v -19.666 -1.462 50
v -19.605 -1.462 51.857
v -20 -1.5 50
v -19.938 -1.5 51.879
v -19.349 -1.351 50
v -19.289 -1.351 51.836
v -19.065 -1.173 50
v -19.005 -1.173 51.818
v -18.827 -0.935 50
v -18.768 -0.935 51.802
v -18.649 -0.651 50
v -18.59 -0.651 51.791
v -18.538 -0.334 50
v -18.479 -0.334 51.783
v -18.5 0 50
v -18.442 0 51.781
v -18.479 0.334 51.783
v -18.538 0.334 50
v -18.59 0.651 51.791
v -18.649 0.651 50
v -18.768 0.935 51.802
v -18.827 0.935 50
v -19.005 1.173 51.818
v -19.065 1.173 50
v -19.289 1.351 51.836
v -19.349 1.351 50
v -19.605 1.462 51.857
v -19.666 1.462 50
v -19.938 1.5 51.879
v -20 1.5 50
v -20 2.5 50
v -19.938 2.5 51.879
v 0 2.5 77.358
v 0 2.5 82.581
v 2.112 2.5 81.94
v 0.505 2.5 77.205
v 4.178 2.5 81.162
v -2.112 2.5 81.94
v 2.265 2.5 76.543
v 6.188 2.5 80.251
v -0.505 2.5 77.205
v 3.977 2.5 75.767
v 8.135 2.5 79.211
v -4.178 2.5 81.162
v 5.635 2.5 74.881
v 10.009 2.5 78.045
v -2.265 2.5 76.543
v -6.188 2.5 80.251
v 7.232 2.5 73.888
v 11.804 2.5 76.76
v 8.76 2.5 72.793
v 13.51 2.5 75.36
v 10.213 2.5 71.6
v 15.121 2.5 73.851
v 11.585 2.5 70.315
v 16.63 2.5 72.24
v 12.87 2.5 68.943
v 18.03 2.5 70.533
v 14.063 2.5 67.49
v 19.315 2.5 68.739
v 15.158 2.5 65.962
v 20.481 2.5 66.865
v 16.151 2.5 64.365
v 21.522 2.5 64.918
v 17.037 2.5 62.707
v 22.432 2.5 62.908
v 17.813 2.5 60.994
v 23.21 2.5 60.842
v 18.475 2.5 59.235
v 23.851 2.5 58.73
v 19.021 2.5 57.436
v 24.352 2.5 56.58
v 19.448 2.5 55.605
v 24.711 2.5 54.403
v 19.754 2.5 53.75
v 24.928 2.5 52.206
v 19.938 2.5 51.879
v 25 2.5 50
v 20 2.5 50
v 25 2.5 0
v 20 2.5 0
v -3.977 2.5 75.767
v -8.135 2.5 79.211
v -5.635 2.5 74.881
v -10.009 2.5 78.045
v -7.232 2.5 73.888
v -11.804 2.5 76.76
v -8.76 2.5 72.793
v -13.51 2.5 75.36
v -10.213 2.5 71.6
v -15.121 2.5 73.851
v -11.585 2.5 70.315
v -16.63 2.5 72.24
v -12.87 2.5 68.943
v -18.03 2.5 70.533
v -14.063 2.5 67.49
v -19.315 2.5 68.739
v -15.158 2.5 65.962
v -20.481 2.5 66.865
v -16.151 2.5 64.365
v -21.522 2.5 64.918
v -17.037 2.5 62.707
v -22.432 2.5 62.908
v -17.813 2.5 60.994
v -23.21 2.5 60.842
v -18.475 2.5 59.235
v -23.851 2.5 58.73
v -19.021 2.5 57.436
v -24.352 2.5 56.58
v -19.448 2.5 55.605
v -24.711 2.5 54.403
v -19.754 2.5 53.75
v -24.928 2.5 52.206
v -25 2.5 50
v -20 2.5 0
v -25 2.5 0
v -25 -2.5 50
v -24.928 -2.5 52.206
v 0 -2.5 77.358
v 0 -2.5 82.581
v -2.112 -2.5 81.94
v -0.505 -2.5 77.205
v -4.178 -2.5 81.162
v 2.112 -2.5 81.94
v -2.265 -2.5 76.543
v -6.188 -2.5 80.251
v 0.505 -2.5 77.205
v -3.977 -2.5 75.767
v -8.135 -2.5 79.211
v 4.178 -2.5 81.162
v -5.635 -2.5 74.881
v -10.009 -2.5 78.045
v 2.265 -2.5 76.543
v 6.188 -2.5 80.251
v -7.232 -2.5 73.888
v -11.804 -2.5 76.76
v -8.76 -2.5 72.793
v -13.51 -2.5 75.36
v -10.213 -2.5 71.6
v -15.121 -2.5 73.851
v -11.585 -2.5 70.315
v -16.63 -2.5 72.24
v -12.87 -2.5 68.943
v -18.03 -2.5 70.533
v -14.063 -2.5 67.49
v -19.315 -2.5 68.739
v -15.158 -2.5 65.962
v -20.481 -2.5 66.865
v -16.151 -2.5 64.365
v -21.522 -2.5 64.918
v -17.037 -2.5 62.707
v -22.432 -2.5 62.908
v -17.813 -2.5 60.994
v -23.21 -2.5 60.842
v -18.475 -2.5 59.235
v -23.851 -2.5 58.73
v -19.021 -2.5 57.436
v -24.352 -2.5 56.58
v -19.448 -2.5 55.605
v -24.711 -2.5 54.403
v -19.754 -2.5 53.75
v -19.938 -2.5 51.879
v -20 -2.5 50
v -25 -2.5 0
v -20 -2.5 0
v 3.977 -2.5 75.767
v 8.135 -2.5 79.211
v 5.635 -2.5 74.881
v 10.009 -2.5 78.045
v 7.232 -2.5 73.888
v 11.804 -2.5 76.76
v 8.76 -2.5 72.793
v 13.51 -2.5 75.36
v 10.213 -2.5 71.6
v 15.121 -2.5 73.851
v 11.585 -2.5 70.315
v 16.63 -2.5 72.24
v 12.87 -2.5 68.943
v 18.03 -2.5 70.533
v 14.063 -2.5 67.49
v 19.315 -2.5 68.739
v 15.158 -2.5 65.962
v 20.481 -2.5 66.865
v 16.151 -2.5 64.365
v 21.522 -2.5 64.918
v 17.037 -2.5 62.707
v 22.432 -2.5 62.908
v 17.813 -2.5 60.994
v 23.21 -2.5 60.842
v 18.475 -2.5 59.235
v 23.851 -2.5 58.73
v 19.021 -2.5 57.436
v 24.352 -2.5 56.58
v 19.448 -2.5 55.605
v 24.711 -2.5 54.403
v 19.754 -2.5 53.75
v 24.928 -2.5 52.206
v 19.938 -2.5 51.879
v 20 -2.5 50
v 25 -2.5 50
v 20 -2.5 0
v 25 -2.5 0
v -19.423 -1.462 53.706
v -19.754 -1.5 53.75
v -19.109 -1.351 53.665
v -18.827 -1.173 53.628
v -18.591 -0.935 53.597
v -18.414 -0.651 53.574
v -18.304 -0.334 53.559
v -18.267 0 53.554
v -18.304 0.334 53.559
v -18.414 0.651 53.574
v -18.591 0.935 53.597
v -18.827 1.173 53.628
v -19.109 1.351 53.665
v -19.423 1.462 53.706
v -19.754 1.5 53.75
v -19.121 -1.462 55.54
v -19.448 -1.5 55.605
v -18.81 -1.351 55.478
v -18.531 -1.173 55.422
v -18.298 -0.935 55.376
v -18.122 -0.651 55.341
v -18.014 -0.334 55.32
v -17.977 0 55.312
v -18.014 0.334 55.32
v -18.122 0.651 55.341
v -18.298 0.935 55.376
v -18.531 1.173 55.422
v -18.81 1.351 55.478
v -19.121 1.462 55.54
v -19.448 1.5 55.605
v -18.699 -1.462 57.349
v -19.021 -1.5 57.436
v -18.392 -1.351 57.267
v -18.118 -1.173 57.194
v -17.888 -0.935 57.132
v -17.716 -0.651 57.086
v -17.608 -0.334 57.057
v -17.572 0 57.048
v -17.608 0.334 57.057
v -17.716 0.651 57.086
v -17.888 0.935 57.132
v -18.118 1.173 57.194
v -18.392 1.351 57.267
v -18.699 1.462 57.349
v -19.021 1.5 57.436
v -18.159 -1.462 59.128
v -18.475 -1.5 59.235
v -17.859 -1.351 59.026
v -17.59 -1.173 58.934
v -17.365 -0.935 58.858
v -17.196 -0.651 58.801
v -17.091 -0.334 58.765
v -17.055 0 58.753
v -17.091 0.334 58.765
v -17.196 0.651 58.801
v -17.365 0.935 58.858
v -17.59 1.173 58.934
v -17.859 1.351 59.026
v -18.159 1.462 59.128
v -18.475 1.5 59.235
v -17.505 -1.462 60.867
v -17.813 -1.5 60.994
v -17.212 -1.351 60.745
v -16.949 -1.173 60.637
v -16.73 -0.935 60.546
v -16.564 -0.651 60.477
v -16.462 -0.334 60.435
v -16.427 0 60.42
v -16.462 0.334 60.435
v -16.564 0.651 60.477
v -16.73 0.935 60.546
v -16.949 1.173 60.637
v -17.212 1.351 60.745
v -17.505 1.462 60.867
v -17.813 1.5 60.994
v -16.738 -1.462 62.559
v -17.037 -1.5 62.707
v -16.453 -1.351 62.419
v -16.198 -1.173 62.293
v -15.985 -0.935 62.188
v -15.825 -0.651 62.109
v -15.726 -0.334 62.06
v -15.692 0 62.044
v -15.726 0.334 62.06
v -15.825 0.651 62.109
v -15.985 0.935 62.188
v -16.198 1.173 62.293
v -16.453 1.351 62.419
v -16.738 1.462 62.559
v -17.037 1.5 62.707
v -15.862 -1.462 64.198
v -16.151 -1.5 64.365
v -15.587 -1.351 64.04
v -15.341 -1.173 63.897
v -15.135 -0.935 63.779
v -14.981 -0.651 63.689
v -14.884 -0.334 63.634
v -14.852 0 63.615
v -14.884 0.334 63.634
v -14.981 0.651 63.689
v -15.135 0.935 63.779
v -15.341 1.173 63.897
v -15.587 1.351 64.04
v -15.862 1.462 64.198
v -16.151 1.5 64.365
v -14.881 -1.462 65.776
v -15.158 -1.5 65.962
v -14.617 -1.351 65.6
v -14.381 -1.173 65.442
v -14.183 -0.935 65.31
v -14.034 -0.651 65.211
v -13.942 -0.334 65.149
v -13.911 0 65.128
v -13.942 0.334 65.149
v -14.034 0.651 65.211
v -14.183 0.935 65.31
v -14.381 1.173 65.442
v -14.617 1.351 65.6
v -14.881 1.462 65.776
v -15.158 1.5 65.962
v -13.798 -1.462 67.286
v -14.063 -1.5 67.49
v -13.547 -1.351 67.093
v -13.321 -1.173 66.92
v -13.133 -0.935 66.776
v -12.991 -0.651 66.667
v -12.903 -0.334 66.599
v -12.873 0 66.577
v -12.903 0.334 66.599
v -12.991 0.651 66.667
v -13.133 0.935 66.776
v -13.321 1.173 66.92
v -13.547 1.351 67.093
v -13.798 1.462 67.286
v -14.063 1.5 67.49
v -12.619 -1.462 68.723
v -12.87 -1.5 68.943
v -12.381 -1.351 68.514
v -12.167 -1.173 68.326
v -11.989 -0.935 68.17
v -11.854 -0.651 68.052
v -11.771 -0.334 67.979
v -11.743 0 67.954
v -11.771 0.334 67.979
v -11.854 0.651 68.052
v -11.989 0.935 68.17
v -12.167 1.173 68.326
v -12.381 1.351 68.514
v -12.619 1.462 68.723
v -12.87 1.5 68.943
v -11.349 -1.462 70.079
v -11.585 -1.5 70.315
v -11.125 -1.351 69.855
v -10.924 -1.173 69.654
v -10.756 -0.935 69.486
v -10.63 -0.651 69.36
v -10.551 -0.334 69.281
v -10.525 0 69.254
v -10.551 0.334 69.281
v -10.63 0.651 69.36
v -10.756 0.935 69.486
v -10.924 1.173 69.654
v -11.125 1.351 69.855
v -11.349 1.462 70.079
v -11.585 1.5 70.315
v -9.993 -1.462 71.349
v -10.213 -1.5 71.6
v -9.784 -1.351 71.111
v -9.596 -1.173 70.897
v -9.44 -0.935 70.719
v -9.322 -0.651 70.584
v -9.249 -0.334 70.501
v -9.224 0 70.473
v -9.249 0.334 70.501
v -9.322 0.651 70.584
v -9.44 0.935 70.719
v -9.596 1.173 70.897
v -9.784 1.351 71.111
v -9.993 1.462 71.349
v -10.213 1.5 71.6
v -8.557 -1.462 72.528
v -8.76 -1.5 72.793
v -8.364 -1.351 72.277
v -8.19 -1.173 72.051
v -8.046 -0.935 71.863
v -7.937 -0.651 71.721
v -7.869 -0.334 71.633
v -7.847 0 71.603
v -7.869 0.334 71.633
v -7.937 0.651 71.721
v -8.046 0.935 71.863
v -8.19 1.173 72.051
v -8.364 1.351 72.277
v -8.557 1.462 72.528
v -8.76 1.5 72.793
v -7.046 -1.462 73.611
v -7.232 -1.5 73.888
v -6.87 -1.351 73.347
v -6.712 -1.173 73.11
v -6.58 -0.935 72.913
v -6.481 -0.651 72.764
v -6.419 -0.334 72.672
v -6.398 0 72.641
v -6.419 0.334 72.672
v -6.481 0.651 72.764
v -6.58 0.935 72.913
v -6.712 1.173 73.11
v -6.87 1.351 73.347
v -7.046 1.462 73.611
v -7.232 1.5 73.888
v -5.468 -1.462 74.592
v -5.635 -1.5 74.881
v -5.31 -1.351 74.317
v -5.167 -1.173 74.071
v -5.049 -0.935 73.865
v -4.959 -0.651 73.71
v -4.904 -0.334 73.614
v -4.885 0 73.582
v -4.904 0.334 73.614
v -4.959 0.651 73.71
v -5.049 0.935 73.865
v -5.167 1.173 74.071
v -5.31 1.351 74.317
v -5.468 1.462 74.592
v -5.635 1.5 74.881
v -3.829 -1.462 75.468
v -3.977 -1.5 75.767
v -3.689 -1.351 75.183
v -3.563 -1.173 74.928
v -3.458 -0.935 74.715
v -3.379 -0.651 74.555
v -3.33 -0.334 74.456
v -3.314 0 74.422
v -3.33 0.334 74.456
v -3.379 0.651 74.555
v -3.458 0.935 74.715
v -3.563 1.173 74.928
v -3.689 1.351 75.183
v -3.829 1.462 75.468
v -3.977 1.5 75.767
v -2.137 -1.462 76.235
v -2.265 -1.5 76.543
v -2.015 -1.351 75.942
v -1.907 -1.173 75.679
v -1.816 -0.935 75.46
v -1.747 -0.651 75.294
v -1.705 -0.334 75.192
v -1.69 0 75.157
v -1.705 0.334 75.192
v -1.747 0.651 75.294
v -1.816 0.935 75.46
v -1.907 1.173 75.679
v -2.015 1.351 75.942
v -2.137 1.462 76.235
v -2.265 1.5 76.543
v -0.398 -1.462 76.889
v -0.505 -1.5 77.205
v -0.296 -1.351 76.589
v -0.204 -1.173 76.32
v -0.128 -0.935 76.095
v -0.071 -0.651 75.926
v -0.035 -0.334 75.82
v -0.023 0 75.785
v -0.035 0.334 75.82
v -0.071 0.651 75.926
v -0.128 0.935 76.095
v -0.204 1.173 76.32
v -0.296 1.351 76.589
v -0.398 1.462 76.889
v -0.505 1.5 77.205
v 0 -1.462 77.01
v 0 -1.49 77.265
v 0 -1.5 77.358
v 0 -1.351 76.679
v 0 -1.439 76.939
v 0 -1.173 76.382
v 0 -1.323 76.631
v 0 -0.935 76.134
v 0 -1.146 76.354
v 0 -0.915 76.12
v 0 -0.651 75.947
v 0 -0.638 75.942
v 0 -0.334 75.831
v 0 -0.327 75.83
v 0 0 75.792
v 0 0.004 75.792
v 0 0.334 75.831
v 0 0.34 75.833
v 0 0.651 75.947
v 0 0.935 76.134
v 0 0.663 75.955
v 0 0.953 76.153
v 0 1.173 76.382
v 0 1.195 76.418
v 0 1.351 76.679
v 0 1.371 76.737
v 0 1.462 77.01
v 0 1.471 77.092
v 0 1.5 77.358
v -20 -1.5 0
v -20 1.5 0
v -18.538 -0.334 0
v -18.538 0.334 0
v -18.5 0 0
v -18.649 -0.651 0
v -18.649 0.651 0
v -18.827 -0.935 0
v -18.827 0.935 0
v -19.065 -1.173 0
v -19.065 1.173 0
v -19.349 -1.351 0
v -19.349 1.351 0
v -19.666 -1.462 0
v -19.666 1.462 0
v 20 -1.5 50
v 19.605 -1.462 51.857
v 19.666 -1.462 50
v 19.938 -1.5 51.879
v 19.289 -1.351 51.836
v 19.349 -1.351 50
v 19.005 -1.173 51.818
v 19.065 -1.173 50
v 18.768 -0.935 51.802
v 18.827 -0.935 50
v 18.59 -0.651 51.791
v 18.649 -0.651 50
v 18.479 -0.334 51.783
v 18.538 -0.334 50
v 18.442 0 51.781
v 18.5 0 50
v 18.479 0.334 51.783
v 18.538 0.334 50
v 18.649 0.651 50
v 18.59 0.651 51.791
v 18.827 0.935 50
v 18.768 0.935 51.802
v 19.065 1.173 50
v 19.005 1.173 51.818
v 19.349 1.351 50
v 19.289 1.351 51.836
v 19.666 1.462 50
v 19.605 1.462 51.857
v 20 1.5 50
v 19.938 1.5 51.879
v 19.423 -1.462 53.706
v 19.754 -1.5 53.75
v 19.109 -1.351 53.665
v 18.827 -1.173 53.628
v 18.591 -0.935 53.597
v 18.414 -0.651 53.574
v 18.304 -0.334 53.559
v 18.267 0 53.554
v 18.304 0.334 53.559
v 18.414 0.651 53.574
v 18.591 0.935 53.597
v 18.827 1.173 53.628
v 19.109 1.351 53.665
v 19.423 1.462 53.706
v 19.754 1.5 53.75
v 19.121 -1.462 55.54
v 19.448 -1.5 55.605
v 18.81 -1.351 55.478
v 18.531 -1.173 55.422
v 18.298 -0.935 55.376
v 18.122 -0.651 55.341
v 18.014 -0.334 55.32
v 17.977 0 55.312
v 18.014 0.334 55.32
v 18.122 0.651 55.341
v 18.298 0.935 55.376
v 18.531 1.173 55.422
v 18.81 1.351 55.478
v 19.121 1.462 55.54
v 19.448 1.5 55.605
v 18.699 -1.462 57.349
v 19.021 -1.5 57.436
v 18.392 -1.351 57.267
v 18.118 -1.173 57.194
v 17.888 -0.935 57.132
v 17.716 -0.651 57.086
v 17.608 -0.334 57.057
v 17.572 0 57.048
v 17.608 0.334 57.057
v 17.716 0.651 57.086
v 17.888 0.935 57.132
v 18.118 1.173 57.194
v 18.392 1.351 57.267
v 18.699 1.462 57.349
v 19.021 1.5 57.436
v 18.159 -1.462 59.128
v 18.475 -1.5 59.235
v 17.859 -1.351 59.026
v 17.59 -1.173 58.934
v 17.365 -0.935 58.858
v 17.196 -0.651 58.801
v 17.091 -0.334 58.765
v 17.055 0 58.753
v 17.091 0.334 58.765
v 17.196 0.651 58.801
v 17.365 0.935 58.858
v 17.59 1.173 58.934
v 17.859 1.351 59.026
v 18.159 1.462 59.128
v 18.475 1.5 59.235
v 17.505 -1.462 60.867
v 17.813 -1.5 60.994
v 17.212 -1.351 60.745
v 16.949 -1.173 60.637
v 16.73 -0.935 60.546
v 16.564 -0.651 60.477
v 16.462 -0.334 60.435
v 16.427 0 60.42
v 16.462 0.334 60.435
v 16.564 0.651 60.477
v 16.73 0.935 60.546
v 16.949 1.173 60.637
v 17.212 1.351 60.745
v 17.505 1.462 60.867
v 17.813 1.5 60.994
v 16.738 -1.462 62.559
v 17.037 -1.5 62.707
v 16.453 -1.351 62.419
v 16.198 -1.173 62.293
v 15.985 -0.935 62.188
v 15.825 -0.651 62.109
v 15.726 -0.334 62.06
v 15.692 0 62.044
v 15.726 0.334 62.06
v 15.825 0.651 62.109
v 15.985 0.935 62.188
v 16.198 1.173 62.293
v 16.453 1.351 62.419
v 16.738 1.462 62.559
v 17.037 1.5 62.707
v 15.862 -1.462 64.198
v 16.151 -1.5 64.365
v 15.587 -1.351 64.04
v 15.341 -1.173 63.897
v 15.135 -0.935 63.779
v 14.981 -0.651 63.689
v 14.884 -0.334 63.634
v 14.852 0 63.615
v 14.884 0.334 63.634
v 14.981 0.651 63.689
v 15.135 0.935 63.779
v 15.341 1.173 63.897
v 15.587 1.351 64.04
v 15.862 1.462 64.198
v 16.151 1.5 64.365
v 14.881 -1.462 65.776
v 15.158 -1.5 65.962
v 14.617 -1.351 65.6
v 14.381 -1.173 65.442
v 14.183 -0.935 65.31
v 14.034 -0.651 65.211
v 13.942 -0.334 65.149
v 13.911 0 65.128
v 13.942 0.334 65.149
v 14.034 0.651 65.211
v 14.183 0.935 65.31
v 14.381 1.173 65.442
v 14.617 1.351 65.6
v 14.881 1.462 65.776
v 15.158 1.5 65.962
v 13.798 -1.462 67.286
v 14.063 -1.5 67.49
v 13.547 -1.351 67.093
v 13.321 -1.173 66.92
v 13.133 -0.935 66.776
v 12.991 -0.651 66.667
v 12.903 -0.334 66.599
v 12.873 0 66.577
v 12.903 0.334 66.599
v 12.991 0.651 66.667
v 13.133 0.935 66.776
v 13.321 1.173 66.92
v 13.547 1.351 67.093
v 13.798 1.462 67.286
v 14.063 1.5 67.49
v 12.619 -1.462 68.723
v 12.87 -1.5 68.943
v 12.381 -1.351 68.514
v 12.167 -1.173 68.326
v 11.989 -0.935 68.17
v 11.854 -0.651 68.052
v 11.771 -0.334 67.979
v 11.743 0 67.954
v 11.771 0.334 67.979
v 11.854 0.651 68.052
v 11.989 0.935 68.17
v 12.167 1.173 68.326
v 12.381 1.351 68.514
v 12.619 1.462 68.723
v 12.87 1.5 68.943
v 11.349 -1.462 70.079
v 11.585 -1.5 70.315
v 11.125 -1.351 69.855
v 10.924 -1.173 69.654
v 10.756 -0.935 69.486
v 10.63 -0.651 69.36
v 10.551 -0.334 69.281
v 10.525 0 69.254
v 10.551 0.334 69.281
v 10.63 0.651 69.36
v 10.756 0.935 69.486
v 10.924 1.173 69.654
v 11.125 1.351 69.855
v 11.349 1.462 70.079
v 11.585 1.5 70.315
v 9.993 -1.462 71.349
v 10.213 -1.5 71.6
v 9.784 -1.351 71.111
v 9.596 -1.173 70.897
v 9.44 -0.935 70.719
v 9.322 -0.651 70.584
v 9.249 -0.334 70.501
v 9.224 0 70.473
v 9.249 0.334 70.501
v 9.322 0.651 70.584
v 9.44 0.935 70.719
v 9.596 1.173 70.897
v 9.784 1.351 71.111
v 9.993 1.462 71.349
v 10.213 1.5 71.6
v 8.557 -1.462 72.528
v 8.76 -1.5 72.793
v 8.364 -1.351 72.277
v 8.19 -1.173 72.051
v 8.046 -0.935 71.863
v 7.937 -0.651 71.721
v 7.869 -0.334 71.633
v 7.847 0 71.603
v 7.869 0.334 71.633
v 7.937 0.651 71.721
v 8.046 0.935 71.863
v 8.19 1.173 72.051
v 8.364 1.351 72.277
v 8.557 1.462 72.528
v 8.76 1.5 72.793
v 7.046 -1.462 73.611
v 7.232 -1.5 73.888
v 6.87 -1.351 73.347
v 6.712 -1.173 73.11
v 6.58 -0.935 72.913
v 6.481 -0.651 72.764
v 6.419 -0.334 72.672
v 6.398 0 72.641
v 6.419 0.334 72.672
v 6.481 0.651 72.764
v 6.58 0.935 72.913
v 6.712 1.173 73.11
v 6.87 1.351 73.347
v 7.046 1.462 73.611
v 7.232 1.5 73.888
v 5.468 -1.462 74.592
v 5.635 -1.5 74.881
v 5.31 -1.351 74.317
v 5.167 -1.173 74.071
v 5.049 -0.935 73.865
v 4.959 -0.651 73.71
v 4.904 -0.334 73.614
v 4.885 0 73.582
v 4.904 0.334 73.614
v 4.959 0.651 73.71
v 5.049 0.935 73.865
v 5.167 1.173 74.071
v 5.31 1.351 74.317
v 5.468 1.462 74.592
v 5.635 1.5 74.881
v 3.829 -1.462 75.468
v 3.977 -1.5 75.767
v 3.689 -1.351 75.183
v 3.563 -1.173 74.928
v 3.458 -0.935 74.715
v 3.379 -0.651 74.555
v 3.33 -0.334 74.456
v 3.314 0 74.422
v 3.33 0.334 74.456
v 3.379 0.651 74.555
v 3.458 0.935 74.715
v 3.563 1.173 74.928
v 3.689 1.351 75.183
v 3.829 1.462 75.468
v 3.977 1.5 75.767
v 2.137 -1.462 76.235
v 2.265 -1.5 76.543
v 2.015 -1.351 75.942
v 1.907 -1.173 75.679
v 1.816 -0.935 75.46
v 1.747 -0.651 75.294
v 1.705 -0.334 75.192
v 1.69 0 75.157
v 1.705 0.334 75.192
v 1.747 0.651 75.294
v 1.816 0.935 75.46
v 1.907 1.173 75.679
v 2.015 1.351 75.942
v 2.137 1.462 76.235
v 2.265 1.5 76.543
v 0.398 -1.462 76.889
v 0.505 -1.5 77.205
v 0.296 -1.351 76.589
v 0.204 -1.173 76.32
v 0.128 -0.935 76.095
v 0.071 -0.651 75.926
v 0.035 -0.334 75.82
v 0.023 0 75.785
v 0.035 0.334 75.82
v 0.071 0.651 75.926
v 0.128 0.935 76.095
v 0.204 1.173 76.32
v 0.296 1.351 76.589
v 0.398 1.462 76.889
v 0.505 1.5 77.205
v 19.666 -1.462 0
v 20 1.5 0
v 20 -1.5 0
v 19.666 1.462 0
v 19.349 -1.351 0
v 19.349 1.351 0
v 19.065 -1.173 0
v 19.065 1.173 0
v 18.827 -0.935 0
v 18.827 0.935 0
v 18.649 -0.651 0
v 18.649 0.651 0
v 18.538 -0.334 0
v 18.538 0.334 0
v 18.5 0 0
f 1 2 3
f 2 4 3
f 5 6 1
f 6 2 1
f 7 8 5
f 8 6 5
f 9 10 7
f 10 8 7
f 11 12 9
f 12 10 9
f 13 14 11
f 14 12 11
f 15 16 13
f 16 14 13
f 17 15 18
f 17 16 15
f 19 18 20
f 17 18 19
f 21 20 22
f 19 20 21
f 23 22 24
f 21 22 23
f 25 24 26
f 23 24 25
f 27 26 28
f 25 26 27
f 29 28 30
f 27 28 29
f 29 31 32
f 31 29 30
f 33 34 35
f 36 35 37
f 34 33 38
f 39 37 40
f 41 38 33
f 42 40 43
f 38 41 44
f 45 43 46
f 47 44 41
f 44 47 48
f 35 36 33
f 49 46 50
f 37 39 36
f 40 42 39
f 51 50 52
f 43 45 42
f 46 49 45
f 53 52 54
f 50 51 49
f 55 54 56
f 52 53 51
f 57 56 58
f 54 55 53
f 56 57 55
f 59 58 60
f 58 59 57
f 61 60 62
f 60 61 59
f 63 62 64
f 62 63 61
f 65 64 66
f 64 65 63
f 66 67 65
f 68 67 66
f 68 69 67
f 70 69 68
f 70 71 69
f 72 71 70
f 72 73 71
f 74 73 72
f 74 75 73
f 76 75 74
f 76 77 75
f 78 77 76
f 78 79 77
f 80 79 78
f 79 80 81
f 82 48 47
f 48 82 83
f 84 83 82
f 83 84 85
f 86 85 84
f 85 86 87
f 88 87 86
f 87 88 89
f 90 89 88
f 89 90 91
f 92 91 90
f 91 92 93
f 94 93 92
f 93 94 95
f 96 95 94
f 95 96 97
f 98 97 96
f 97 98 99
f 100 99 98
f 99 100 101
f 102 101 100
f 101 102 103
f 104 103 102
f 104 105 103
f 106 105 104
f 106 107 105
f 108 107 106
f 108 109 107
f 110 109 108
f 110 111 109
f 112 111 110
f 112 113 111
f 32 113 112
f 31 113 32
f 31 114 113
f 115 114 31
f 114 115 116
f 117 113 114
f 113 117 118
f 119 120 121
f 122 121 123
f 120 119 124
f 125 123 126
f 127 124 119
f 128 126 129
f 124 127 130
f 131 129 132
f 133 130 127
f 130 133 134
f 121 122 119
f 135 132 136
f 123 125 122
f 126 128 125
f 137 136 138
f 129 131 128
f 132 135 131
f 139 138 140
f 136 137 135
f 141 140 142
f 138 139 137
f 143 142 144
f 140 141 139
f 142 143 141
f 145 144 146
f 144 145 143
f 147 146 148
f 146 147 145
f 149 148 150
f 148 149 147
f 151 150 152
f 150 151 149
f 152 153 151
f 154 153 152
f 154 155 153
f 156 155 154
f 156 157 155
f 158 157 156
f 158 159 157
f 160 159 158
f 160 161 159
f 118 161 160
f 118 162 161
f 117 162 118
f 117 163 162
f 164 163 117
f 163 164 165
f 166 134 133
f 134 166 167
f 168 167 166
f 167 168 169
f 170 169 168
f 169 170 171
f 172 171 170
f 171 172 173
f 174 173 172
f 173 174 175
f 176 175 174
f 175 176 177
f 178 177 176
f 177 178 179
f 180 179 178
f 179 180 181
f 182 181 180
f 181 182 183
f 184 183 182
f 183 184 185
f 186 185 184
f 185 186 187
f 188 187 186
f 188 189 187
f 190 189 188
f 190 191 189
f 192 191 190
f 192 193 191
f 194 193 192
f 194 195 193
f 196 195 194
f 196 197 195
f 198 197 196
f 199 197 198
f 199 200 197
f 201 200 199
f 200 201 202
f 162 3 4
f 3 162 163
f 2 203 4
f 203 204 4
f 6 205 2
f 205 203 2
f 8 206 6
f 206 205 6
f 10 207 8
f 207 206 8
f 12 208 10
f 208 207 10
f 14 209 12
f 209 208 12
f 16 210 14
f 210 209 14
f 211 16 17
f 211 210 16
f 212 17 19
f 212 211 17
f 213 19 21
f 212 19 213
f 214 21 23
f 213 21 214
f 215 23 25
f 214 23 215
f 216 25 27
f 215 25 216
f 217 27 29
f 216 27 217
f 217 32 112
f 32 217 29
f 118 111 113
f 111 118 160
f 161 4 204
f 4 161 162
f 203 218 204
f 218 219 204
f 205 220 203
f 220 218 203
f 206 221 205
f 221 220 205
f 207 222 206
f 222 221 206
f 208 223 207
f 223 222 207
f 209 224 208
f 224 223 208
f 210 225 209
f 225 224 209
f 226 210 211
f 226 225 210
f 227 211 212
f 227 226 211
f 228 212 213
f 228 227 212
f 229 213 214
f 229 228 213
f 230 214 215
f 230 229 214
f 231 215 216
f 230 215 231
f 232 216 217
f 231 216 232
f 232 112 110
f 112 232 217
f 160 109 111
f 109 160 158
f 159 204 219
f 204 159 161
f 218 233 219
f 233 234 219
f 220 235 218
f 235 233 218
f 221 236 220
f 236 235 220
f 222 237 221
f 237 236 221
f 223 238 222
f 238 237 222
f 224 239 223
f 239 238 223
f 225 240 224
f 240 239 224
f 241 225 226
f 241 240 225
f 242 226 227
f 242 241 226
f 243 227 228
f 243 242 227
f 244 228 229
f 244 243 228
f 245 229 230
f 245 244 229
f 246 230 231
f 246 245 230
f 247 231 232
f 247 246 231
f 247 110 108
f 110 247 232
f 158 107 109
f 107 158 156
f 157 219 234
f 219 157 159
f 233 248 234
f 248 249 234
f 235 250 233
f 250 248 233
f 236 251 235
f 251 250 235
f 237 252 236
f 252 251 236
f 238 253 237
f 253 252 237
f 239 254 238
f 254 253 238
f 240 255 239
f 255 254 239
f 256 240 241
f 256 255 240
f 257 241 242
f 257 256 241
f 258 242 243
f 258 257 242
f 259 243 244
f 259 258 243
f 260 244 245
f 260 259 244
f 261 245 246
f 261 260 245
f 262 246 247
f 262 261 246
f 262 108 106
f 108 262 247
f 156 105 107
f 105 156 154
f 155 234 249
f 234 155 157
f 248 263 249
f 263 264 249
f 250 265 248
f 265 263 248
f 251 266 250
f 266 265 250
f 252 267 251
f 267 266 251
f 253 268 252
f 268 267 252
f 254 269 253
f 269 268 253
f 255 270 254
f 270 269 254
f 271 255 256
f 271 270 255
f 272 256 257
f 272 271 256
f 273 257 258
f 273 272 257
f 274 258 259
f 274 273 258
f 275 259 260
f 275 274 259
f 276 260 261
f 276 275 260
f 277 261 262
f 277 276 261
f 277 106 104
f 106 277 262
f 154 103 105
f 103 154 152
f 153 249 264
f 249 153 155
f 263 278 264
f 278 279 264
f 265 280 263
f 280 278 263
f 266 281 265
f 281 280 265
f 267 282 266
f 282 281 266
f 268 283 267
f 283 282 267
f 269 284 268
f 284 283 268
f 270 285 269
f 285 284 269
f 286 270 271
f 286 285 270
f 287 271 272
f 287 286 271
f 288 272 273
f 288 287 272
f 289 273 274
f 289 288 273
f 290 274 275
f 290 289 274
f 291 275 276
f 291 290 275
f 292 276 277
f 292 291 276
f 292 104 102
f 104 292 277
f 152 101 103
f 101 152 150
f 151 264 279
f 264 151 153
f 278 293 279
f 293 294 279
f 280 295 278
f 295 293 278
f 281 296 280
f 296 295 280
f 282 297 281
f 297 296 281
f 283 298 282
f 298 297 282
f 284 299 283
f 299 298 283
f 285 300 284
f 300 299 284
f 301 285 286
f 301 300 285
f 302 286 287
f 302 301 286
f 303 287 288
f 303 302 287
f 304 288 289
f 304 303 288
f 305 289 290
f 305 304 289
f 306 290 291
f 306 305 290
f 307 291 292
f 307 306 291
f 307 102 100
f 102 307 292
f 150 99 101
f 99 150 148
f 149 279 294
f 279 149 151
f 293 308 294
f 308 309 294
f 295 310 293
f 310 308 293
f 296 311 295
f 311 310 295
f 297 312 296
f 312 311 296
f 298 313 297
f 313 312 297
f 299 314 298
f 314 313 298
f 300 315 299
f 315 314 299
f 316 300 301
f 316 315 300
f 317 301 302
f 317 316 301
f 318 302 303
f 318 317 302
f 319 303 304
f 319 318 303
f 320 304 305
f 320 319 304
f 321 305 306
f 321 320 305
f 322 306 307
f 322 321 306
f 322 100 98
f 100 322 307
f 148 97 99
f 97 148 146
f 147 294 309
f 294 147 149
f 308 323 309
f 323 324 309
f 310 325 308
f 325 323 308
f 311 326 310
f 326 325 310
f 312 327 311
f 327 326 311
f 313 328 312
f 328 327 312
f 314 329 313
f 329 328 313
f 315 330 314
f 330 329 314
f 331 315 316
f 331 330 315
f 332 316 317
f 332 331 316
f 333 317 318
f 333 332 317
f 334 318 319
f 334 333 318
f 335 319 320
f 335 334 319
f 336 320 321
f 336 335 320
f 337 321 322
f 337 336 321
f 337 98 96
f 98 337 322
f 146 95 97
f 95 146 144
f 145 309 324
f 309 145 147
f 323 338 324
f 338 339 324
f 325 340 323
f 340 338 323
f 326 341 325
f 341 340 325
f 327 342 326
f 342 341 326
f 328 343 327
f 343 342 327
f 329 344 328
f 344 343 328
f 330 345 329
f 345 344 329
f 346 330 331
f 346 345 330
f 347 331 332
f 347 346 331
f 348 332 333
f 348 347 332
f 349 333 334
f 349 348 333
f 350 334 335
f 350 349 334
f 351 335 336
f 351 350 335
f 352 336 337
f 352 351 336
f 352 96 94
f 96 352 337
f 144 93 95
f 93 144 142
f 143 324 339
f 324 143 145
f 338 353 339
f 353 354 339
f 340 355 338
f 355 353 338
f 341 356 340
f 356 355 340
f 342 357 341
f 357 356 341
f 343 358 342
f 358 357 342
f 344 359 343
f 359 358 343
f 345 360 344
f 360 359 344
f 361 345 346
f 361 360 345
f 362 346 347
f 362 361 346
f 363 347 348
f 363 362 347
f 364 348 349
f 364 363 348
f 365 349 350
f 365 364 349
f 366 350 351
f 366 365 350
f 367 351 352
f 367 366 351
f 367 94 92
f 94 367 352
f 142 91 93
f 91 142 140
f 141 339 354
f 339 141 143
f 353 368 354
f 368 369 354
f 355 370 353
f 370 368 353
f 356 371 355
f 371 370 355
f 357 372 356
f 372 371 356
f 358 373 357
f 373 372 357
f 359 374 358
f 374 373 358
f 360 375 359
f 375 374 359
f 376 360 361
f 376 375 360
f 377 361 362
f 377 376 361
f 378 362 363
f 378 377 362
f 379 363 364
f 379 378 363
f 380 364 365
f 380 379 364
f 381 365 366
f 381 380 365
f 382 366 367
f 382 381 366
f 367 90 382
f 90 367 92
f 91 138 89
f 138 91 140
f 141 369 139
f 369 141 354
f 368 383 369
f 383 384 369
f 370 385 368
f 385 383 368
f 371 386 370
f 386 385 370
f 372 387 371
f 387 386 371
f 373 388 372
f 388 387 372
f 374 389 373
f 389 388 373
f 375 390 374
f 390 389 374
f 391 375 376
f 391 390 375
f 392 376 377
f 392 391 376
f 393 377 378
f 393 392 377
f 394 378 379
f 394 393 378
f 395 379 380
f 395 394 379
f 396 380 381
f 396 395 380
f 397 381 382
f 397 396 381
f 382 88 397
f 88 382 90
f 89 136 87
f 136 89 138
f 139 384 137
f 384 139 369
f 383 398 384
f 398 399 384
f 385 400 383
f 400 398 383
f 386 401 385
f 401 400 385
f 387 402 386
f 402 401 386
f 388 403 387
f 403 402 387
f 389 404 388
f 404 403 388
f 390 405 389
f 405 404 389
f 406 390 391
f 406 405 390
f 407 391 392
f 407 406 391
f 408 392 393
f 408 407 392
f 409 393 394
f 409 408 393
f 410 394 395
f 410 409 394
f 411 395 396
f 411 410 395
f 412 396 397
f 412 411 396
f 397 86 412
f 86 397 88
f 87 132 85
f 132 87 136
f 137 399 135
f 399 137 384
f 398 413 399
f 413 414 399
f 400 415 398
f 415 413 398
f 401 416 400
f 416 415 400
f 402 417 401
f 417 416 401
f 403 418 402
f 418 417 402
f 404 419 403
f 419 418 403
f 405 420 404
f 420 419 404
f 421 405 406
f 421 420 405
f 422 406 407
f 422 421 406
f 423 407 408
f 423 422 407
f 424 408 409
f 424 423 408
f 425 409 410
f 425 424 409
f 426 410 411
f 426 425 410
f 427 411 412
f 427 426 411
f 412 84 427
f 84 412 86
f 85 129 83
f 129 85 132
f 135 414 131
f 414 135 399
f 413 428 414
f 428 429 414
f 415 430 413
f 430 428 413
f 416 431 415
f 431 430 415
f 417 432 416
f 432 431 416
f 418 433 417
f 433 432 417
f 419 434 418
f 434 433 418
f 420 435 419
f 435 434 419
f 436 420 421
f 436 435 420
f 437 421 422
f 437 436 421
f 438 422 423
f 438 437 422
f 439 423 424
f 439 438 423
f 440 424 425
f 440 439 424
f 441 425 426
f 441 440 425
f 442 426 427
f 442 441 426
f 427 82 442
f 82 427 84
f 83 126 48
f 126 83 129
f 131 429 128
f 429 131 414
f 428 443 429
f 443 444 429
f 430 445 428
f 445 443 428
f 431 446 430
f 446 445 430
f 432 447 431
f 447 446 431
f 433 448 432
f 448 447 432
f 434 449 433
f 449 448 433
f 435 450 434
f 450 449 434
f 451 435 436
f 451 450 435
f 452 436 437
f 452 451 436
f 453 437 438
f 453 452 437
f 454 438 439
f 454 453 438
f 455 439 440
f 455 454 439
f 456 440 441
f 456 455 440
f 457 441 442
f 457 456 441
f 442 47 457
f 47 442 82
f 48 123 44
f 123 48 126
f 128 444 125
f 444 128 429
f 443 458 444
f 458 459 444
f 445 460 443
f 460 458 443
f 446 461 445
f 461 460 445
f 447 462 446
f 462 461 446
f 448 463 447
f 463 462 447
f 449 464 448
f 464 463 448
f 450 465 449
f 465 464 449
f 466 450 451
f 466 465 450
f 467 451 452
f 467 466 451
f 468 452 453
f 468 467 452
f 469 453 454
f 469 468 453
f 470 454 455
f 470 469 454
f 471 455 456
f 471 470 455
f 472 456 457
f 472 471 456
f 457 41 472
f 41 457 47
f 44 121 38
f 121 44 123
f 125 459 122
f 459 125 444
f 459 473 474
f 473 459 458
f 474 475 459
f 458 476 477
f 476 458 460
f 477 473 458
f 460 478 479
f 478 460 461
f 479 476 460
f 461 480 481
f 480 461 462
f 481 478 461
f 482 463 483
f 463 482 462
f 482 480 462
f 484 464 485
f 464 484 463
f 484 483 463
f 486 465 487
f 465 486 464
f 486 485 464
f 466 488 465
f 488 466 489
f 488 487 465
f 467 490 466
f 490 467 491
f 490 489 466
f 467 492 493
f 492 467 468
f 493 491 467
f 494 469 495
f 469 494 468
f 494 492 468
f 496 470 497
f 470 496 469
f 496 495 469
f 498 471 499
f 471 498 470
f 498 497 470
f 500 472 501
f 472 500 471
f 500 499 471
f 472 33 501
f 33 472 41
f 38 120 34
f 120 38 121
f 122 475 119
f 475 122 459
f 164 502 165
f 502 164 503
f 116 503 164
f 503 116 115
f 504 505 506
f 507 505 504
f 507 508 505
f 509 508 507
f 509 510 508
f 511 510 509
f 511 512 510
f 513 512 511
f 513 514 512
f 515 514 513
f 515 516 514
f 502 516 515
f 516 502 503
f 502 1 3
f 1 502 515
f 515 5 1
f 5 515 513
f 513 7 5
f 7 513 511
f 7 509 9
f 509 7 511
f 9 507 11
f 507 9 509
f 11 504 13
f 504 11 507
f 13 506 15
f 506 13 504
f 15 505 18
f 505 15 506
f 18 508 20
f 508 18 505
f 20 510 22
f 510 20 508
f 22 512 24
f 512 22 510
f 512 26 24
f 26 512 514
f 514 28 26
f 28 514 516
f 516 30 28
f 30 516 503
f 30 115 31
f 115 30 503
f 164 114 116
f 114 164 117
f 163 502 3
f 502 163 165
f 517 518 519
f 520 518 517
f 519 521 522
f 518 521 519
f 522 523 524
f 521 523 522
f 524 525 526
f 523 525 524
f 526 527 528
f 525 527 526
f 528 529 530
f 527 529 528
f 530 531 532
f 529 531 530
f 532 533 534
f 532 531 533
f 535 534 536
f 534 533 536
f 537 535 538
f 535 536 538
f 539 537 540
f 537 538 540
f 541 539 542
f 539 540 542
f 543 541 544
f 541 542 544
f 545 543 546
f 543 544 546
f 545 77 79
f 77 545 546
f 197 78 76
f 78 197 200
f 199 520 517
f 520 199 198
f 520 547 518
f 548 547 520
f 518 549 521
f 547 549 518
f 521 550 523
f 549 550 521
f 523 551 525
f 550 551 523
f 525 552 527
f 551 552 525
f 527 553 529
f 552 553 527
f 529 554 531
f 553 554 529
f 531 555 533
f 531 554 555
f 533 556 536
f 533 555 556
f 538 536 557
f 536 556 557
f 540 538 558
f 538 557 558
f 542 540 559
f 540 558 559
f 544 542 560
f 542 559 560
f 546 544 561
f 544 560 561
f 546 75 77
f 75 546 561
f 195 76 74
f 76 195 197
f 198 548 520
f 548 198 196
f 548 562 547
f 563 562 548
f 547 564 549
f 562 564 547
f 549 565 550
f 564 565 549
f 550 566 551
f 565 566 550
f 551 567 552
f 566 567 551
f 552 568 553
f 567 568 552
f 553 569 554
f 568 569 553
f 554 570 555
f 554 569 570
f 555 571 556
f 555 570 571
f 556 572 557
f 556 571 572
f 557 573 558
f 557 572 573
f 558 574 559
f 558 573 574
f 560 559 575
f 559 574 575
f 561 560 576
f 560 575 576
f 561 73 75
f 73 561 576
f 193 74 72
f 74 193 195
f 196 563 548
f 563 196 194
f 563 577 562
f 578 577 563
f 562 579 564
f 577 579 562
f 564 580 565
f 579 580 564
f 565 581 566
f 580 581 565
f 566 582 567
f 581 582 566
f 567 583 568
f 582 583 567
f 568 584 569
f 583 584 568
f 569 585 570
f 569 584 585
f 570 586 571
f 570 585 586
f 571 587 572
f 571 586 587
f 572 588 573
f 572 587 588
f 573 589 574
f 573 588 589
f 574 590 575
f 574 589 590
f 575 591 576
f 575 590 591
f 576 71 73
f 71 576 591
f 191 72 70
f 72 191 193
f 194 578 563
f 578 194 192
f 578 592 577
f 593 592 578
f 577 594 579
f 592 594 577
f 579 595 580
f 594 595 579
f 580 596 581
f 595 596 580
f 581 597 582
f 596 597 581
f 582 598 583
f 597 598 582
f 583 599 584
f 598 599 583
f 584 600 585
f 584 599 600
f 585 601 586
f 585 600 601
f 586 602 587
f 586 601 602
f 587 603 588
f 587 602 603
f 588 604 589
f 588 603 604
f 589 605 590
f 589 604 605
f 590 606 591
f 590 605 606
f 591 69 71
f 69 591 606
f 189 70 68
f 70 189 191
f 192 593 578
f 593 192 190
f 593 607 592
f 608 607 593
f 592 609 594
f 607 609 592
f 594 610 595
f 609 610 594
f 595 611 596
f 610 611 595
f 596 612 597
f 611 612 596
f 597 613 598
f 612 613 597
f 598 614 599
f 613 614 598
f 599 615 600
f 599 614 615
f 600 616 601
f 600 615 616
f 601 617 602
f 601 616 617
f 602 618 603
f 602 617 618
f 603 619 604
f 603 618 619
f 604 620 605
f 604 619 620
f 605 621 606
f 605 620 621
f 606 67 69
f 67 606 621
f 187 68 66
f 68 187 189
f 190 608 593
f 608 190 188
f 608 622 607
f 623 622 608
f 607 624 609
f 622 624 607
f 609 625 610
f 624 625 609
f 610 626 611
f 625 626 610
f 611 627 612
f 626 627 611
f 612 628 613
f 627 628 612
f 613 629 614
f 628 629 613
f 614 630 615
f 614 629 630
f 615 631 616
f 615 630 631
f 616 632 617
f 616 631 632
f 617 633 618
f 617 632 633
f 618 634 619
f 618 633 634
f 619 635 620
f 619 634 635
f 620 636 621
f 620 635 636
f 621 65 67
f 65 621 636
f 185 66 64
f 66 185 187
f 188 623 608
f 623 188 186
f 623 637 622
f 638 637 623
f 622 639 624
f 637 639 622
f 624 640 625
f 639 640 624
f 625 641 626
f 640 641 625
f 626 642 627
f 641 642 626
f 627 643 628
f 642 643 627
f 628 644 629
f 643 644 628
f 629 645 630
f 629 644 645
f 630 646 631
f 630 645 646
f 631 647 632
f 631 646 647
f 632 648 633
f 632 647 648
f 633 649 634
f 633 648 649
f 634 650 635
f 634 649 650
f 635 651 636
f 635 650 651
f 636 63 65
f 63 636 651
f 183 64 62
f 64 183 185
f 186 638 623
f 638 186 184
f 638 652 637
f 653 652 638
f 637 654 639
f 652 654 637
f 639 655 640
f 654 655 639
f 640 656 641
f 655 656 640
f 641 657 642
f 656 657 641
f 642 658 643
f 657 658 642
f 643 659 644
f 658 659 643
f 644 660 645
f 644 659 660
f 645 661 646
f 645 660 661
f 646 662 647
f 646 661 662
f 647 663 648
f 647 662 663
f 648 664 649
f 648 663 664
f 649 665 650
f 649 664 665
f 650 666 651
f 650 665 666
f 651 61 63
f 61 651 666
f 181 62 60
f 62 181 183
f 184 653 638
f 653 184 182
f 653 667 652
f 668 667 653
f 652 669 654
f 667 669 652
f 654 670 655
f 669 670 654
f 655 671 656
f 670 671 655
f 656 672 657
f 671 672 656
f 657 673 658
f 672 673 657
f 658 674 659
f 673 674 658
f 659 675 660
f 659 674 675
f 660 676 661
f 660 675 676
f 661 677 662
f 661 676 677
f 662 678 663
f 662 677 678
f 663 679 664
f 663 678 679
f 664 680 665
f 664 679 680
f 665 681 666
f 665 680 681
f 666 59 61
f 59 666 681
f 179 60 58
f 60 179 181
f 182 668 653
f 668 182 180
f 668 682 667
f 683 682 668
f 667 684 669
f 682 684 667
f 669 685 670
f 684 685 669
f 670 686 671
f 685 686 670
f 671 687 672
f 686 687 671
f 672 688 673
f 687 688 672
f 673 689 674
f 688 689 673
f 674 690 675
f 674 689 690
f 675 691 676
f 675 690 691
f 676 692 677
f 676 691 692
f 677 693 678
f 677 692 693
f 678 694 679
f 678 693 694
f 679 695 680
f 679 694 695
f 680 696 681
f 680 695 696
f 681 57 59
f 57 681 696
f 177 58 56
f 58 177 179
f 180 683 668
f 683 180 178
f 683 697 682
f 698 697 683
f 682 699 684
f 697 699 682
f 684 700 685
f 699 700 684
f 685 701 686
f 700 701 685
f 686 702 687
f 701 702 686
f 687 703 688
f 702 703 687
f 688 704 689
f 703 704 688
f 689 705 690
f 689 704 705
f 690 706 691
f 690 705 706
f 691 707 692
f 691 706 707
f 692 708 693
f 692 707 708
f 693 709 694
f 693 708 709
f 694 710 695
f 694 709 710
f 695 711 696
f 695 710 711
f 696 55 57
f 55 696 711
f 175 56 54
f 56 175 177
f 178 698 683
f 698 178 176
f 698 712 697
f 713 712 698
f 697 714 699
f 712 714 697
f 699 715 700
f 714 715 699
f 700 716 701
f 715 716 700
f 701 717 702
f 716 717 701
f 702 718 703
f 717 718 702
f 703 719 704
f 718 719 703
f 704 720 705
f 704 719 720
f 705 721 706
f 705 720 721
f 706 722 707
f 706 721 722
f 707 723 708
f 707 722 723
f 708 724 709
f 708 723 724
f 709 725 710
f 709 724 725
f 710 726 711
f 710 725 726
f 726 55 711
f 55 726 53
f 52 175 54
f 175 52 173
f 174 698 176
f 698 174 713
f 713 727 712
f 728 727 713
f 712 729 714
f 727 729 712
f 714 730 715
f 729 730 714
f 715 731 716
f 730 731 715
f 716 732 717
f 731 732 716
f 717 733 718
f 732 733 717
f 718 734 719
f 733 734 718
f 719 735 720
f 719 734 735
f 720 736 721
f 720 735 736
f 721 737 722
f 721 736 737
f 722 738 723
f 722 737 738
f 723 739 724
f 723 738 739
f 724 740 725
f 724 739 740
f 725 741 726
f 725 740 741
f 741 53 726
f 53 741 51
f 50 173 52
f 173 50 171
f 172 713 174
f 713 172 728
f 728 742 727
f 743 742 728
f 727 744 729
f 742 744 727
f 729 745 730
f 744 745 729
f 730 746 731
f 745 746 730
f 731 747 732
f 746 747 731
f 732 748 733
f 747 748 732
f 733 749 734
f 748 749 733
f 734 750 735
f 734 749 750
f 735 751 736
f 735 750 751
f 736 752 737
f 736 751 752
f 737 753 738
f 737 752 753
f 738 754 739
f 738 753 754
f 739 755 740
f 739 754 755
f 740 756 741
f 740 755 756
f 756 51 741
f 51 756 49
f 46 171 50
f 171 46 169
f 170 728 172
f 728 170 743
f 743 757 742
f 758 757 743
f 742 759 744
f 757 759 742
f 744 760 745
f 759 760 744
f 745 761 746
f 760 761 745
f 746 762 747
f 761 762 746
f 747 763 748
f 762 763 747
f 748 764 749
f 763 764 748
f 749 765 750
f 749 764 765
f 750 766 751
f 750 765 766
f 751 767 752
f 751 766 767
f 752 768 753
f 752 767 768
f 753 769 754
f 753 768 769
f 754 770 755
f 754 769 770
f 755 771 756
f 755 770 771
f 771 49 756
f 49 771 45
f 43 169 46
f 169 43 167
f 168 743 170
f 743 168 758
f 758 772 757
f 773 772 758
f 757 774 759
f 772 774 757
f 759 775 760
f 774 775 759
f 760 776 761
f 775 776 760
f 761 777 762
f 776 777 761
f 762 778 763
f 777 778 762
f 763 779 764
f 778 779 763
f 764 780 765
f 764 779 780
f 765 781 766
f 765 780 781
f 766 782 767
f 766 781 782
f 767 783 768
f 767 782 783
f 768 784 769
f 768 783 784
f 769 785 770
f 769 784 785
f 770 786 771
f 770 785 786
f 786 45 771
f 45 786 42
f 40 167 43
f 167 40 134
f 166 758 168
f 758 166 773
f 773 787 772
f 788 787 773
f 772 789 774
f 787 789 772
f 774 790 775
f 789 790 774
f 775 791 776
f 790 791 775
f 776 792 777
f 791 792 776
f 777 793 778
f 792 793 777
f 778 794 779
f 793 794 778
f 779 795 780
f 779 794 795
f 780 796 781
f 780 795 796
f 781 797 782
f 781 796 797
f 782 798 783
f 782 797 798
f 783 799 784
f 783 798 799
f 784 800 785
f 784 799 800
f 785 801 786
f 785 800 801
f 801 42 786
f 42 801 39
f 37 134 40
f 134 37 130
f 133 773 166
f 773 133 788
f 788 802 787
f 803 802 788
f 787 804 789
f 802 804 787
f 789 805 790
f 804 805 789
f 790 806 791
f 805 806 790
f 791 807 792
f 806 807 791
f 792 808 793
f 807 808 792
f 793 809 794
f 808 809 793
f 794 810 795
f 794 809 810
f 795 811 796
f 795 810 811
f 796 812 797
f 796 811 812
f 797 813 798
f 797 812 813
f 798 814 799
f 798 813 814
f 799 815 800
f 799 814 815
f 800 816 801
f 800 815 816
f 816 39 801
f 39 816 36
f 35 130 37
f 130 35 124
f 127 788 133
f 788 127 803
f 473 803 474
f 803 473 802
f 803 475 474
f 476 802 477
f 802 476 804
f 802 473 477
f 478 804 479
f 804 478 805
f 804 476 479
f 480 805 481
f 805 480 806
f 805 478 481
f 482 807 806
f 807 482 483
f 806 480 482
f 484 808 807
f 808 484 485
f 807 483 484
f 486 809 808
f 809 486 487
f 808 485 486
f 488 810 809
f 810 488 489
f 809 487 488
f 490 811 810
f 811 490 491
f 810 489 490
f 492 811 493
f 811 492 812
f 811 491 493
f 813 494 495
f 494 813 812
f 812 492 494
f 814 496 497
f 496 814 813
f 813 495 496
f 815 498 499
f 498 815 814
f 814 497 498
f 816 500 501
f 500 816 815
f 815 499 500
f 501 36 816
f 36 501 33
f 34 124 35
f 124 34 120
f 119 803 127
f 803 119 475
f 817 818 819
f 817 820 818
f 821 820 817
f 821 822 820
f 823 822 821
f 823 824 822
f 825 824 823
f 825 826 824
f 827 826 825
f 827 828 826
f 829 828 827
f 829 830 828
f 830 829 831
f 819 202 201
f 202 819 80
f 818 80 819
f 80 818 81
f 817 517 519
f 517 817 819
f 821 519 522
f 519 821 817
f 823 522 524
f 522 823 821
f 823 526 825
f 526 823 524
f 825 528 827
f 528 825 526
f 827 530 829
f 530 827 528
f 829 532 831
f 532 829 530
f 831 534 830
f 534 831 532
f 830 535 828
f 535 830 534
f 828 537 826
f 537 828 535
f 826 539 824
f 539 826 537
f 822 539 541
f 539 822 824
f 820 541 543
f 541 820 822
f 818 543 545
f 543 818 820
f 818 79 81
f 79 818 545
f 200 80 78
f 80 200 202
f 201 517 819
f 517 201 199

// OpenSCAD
module arch(
    arch_width  = 50,
    arch_base = 5,
    arch_angle = 75,
    pillar_height = 50,) {
        
    arch_radius = arch_width / (2 - 2 * cos(arch_angle) );
    
    module basic_shape() {
        union() {
        translate( [0, -arch_base / 2] )
            square( arch_base );

        translate( [arch_base, 0])
            circle( d = arch_base * 3 / 5, $fn=28);
        }
    }

    translate( [0, 0, pillar_height] )
    for (m = [0:1] )
    mirror( [m, 0, 0] )
    translate( [cos(arch_angle) * arch_radius, 0, 0] )
    union() {
        rotate( [-90, 0, 0])
        rotate_extrude( angle = arch_angle, $fn = 100 )
        translate( [-arch_radius, 0] )
        basic_shape();

        translate( [0, 0, -pillar_height] )
        linear_extrude( height = pillar_height )
        translate( [-arch_radius, 0] )
        basic_shape();
    }
    
    }
    
arch();
